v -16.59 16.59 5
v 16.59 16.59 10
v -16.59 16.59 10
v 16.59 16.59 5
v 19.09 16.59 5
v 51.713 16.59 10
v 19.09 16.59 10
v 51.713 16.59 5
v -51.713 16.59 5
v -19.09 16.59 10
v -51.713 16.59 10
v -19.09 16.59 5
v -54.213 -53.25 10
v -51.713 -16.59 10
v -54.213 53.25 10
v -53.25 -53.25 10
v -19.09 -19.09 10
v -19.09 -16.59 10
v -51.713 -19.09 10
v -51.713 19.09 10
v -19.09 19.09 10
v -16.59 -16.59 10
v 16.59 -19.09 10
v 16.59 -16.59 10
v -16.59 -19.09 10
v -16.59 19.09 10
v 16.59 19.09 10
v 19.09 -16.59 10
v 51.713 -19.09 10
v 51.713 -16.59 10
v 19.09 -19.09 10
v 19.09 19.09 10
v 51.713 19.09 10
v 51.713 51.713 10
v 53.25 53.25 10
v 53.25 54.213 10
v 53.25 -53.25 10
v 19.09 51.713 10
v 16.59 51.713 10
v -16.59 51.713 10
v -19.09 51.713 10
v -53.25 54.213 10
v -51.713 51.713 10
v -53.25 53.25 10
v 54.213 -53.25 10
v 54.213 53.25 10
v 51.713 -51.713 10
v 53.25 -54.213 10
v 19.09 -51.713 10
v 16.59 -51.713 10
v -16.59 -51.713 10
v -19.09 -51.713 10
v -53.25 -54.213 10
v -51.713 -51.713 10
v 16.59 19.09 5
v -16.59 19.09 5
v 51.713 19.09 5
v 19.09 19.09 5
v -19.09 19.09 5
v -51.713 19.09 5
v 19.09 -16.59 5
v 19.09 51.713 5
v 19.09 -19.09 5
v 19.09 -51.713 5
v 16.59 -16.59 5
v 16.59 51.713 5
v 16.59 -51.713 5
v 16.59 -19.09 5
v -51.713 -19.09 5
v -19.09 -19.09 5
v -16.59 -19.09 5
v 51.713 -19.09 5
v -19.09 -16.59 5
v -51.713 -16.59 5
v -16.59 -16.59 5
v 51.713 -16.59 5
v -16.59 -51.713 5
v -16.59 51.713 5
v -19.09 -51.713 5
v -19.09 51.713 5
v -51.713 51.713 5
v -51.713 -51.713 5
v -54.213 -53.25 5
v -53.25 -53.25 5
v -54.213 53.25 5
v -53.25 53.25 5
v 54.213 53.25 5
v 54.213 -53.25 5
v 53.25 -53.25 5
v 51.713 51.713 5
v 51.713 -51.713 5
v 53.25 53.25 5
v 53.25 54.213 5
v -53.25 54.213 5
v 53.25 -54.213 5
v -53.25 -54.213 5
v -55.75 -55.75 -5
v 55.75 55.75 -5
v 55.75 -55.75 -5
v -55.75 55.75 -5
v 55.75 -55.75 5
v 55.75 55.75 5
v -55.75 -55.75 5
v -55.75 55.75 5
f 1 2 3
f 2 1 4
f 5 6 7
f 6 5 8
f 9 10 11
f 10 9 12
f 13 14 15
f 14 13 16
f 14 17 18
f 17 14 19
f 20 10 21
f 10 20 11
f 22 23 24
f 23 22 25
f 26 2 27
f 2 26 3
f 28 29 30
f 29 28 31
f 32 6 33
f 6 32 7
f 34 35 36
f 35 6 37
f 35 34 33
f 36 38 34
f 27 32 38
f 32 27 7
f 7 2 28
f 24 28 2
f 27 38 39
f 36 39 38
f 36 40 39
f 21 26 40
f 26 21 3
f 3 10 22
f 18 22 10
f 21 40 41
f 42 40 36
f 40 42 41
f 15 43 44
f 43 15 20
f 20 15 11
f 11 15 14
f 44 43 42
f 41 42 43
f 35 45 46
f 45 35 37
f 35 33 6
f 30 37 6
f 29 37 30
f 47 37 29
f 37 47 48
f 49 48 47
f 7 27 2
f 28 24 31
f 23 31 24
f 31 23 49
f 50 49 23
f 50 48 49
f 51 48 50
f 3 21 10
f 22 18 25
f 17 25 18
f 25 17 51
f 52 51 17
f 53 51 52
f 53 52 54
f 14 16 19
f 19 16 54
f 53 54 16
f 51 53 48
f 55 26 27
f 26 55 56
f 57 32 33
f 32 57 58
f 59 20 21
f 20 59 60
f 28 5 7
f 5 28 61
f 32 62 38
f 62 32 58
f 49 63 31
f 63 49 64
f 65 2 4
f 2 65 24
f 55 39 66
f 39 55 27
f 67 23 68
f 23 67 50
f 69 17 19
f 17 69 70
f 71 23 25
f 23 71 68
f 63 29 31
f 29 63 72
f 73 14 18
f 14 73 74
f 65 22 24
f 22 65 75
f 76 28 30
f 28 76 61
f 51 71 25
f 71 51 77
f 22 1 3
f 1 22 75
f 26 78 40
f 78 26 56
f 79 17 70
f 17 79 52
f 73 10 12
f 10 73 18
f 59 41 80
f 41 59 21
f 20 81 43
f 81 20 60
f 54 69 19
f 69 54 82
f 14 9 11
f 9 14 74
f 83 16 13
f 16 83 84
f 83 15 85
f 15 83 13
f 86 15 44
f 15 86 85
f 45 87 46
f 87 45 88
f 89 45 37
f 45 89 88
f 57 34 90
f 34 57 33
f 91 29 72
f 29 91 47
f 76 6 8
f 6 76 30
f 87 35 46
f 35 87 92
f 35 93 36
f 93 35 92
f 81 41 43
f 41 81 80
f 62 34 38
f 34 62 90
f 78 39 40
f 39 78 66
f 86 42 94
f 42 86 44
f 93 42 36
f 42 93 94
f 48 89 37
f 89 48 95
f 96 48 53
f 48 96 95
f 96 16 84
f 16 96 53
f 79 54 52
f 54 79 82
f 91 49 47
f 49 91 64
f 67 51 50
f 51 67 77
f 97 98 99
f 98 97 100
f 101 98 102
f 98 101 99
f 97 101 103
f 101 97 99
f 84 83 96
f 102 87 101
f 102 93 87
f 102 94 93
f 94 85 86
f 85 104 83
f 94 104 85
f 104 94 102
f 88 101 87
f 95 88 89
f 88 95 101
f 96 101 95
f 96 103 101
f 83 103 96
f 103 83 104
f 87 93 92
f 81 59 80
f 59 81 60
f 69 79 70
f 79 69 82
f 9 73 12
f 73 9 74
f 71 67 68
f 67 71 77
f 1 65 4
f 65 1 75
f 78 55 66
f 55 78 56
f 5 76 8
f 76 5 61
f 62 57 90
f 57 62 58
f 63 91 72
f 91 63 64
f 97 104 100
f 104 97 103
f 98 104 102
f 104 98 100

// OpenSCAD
union()
{
    linear_extrude(height = 10.0, twist = 0.0, scale = 1.0, slices = 1, center = true)
    {
        scale([111.5, 111.5])
        {
            M8();
        }
    }
    union()
    {
        union()
        {
            union()
            {
                translate([0.0, 17.84, 0.0])
                {
                    linear_extrude(height = 10.0, twist = 0.0, scale = 1.0, slices = 1, center = false)
                    {
                        scale([106.5, 2.5])
                        {
                            M8();
                        }
                    }
                }
                translate([17.84, 0.0, 0.0])
                {
                    linear_extrude(height = 10.0, twist = 0.0, scale = 1.0, slices = 1, center = false)
                    {
                        scale([2.5, 106.5])
                        {
                            M8();
                        }
                    }
                }
            }
            union()
            {
                translate([0.0, -17.84, 0.0])
                {
                    linear_extrude(height = 10.0, twist = 0.0, scale = 1.0, slices = 1, center = false)
                    {
                        scale([106.5, 2.5])
                        {
                            M8();
                        }
                    }
                }
                translate([-17.84, 0.0, 0.0])
                {
                    linear_extrude(height = 10.0, twist = 0.0, scale = 1.0, slices = 1, center = false)
                    {
                        scale([2.5, 106.5])
                        {
                            M8();
                        }
                    }
                }
            }
        }
        union()
        {
            union()
            {
                translate([-52.9625, 0.0, 0.0])
                {
                    linear_extrude(height = 10.0, twist = 0.0, scale = 1.0, slices = 1, center = false)
                    {
                        scale([2.5, 106.5])
                        {
                            M8();
                        }
                    }
                }
                translate([52.9625, 0.0, 0.0])
                {
                    linear_extrude(height = 10.0, twist = 0.0, scale = 1.0, slices = 1, center = false)
                    {
                        scale([2.5, 106.5])
                        {
                            M8();
                        }
                    }
                }
            }
            union()
            {
                translate([0.0, 52.9625, 0.0])
                {
                    linear_extrude(height = 10.0, twist = 0.0, scale = 1.0, slices = 1, center = false)
                    {
                        scale([106.5, 2.5])
                        {
                            M8();
                        }
                    }
                }
                translate([0.0, -52.9625, 0.0])
                {
                    linear_extrude(height = 10.0, twist = 0.0, scale = 1.0, slices = 1, center = false)
                    {
                        scale([106.5, 2.5])
                        {
                            M8();
                        }
                    }
                }
            }
        }
    }
}

module M8()
{
    polygon
    (
        points =
        [
            [-0.5, -0.5], 
            [0.5, -0.5], 
            [0.5, 0.5], 
            [-0.5, 0.5]
        ],
        paths =
        [
            [0, 1, 2, 3]
        ]
    );
}
